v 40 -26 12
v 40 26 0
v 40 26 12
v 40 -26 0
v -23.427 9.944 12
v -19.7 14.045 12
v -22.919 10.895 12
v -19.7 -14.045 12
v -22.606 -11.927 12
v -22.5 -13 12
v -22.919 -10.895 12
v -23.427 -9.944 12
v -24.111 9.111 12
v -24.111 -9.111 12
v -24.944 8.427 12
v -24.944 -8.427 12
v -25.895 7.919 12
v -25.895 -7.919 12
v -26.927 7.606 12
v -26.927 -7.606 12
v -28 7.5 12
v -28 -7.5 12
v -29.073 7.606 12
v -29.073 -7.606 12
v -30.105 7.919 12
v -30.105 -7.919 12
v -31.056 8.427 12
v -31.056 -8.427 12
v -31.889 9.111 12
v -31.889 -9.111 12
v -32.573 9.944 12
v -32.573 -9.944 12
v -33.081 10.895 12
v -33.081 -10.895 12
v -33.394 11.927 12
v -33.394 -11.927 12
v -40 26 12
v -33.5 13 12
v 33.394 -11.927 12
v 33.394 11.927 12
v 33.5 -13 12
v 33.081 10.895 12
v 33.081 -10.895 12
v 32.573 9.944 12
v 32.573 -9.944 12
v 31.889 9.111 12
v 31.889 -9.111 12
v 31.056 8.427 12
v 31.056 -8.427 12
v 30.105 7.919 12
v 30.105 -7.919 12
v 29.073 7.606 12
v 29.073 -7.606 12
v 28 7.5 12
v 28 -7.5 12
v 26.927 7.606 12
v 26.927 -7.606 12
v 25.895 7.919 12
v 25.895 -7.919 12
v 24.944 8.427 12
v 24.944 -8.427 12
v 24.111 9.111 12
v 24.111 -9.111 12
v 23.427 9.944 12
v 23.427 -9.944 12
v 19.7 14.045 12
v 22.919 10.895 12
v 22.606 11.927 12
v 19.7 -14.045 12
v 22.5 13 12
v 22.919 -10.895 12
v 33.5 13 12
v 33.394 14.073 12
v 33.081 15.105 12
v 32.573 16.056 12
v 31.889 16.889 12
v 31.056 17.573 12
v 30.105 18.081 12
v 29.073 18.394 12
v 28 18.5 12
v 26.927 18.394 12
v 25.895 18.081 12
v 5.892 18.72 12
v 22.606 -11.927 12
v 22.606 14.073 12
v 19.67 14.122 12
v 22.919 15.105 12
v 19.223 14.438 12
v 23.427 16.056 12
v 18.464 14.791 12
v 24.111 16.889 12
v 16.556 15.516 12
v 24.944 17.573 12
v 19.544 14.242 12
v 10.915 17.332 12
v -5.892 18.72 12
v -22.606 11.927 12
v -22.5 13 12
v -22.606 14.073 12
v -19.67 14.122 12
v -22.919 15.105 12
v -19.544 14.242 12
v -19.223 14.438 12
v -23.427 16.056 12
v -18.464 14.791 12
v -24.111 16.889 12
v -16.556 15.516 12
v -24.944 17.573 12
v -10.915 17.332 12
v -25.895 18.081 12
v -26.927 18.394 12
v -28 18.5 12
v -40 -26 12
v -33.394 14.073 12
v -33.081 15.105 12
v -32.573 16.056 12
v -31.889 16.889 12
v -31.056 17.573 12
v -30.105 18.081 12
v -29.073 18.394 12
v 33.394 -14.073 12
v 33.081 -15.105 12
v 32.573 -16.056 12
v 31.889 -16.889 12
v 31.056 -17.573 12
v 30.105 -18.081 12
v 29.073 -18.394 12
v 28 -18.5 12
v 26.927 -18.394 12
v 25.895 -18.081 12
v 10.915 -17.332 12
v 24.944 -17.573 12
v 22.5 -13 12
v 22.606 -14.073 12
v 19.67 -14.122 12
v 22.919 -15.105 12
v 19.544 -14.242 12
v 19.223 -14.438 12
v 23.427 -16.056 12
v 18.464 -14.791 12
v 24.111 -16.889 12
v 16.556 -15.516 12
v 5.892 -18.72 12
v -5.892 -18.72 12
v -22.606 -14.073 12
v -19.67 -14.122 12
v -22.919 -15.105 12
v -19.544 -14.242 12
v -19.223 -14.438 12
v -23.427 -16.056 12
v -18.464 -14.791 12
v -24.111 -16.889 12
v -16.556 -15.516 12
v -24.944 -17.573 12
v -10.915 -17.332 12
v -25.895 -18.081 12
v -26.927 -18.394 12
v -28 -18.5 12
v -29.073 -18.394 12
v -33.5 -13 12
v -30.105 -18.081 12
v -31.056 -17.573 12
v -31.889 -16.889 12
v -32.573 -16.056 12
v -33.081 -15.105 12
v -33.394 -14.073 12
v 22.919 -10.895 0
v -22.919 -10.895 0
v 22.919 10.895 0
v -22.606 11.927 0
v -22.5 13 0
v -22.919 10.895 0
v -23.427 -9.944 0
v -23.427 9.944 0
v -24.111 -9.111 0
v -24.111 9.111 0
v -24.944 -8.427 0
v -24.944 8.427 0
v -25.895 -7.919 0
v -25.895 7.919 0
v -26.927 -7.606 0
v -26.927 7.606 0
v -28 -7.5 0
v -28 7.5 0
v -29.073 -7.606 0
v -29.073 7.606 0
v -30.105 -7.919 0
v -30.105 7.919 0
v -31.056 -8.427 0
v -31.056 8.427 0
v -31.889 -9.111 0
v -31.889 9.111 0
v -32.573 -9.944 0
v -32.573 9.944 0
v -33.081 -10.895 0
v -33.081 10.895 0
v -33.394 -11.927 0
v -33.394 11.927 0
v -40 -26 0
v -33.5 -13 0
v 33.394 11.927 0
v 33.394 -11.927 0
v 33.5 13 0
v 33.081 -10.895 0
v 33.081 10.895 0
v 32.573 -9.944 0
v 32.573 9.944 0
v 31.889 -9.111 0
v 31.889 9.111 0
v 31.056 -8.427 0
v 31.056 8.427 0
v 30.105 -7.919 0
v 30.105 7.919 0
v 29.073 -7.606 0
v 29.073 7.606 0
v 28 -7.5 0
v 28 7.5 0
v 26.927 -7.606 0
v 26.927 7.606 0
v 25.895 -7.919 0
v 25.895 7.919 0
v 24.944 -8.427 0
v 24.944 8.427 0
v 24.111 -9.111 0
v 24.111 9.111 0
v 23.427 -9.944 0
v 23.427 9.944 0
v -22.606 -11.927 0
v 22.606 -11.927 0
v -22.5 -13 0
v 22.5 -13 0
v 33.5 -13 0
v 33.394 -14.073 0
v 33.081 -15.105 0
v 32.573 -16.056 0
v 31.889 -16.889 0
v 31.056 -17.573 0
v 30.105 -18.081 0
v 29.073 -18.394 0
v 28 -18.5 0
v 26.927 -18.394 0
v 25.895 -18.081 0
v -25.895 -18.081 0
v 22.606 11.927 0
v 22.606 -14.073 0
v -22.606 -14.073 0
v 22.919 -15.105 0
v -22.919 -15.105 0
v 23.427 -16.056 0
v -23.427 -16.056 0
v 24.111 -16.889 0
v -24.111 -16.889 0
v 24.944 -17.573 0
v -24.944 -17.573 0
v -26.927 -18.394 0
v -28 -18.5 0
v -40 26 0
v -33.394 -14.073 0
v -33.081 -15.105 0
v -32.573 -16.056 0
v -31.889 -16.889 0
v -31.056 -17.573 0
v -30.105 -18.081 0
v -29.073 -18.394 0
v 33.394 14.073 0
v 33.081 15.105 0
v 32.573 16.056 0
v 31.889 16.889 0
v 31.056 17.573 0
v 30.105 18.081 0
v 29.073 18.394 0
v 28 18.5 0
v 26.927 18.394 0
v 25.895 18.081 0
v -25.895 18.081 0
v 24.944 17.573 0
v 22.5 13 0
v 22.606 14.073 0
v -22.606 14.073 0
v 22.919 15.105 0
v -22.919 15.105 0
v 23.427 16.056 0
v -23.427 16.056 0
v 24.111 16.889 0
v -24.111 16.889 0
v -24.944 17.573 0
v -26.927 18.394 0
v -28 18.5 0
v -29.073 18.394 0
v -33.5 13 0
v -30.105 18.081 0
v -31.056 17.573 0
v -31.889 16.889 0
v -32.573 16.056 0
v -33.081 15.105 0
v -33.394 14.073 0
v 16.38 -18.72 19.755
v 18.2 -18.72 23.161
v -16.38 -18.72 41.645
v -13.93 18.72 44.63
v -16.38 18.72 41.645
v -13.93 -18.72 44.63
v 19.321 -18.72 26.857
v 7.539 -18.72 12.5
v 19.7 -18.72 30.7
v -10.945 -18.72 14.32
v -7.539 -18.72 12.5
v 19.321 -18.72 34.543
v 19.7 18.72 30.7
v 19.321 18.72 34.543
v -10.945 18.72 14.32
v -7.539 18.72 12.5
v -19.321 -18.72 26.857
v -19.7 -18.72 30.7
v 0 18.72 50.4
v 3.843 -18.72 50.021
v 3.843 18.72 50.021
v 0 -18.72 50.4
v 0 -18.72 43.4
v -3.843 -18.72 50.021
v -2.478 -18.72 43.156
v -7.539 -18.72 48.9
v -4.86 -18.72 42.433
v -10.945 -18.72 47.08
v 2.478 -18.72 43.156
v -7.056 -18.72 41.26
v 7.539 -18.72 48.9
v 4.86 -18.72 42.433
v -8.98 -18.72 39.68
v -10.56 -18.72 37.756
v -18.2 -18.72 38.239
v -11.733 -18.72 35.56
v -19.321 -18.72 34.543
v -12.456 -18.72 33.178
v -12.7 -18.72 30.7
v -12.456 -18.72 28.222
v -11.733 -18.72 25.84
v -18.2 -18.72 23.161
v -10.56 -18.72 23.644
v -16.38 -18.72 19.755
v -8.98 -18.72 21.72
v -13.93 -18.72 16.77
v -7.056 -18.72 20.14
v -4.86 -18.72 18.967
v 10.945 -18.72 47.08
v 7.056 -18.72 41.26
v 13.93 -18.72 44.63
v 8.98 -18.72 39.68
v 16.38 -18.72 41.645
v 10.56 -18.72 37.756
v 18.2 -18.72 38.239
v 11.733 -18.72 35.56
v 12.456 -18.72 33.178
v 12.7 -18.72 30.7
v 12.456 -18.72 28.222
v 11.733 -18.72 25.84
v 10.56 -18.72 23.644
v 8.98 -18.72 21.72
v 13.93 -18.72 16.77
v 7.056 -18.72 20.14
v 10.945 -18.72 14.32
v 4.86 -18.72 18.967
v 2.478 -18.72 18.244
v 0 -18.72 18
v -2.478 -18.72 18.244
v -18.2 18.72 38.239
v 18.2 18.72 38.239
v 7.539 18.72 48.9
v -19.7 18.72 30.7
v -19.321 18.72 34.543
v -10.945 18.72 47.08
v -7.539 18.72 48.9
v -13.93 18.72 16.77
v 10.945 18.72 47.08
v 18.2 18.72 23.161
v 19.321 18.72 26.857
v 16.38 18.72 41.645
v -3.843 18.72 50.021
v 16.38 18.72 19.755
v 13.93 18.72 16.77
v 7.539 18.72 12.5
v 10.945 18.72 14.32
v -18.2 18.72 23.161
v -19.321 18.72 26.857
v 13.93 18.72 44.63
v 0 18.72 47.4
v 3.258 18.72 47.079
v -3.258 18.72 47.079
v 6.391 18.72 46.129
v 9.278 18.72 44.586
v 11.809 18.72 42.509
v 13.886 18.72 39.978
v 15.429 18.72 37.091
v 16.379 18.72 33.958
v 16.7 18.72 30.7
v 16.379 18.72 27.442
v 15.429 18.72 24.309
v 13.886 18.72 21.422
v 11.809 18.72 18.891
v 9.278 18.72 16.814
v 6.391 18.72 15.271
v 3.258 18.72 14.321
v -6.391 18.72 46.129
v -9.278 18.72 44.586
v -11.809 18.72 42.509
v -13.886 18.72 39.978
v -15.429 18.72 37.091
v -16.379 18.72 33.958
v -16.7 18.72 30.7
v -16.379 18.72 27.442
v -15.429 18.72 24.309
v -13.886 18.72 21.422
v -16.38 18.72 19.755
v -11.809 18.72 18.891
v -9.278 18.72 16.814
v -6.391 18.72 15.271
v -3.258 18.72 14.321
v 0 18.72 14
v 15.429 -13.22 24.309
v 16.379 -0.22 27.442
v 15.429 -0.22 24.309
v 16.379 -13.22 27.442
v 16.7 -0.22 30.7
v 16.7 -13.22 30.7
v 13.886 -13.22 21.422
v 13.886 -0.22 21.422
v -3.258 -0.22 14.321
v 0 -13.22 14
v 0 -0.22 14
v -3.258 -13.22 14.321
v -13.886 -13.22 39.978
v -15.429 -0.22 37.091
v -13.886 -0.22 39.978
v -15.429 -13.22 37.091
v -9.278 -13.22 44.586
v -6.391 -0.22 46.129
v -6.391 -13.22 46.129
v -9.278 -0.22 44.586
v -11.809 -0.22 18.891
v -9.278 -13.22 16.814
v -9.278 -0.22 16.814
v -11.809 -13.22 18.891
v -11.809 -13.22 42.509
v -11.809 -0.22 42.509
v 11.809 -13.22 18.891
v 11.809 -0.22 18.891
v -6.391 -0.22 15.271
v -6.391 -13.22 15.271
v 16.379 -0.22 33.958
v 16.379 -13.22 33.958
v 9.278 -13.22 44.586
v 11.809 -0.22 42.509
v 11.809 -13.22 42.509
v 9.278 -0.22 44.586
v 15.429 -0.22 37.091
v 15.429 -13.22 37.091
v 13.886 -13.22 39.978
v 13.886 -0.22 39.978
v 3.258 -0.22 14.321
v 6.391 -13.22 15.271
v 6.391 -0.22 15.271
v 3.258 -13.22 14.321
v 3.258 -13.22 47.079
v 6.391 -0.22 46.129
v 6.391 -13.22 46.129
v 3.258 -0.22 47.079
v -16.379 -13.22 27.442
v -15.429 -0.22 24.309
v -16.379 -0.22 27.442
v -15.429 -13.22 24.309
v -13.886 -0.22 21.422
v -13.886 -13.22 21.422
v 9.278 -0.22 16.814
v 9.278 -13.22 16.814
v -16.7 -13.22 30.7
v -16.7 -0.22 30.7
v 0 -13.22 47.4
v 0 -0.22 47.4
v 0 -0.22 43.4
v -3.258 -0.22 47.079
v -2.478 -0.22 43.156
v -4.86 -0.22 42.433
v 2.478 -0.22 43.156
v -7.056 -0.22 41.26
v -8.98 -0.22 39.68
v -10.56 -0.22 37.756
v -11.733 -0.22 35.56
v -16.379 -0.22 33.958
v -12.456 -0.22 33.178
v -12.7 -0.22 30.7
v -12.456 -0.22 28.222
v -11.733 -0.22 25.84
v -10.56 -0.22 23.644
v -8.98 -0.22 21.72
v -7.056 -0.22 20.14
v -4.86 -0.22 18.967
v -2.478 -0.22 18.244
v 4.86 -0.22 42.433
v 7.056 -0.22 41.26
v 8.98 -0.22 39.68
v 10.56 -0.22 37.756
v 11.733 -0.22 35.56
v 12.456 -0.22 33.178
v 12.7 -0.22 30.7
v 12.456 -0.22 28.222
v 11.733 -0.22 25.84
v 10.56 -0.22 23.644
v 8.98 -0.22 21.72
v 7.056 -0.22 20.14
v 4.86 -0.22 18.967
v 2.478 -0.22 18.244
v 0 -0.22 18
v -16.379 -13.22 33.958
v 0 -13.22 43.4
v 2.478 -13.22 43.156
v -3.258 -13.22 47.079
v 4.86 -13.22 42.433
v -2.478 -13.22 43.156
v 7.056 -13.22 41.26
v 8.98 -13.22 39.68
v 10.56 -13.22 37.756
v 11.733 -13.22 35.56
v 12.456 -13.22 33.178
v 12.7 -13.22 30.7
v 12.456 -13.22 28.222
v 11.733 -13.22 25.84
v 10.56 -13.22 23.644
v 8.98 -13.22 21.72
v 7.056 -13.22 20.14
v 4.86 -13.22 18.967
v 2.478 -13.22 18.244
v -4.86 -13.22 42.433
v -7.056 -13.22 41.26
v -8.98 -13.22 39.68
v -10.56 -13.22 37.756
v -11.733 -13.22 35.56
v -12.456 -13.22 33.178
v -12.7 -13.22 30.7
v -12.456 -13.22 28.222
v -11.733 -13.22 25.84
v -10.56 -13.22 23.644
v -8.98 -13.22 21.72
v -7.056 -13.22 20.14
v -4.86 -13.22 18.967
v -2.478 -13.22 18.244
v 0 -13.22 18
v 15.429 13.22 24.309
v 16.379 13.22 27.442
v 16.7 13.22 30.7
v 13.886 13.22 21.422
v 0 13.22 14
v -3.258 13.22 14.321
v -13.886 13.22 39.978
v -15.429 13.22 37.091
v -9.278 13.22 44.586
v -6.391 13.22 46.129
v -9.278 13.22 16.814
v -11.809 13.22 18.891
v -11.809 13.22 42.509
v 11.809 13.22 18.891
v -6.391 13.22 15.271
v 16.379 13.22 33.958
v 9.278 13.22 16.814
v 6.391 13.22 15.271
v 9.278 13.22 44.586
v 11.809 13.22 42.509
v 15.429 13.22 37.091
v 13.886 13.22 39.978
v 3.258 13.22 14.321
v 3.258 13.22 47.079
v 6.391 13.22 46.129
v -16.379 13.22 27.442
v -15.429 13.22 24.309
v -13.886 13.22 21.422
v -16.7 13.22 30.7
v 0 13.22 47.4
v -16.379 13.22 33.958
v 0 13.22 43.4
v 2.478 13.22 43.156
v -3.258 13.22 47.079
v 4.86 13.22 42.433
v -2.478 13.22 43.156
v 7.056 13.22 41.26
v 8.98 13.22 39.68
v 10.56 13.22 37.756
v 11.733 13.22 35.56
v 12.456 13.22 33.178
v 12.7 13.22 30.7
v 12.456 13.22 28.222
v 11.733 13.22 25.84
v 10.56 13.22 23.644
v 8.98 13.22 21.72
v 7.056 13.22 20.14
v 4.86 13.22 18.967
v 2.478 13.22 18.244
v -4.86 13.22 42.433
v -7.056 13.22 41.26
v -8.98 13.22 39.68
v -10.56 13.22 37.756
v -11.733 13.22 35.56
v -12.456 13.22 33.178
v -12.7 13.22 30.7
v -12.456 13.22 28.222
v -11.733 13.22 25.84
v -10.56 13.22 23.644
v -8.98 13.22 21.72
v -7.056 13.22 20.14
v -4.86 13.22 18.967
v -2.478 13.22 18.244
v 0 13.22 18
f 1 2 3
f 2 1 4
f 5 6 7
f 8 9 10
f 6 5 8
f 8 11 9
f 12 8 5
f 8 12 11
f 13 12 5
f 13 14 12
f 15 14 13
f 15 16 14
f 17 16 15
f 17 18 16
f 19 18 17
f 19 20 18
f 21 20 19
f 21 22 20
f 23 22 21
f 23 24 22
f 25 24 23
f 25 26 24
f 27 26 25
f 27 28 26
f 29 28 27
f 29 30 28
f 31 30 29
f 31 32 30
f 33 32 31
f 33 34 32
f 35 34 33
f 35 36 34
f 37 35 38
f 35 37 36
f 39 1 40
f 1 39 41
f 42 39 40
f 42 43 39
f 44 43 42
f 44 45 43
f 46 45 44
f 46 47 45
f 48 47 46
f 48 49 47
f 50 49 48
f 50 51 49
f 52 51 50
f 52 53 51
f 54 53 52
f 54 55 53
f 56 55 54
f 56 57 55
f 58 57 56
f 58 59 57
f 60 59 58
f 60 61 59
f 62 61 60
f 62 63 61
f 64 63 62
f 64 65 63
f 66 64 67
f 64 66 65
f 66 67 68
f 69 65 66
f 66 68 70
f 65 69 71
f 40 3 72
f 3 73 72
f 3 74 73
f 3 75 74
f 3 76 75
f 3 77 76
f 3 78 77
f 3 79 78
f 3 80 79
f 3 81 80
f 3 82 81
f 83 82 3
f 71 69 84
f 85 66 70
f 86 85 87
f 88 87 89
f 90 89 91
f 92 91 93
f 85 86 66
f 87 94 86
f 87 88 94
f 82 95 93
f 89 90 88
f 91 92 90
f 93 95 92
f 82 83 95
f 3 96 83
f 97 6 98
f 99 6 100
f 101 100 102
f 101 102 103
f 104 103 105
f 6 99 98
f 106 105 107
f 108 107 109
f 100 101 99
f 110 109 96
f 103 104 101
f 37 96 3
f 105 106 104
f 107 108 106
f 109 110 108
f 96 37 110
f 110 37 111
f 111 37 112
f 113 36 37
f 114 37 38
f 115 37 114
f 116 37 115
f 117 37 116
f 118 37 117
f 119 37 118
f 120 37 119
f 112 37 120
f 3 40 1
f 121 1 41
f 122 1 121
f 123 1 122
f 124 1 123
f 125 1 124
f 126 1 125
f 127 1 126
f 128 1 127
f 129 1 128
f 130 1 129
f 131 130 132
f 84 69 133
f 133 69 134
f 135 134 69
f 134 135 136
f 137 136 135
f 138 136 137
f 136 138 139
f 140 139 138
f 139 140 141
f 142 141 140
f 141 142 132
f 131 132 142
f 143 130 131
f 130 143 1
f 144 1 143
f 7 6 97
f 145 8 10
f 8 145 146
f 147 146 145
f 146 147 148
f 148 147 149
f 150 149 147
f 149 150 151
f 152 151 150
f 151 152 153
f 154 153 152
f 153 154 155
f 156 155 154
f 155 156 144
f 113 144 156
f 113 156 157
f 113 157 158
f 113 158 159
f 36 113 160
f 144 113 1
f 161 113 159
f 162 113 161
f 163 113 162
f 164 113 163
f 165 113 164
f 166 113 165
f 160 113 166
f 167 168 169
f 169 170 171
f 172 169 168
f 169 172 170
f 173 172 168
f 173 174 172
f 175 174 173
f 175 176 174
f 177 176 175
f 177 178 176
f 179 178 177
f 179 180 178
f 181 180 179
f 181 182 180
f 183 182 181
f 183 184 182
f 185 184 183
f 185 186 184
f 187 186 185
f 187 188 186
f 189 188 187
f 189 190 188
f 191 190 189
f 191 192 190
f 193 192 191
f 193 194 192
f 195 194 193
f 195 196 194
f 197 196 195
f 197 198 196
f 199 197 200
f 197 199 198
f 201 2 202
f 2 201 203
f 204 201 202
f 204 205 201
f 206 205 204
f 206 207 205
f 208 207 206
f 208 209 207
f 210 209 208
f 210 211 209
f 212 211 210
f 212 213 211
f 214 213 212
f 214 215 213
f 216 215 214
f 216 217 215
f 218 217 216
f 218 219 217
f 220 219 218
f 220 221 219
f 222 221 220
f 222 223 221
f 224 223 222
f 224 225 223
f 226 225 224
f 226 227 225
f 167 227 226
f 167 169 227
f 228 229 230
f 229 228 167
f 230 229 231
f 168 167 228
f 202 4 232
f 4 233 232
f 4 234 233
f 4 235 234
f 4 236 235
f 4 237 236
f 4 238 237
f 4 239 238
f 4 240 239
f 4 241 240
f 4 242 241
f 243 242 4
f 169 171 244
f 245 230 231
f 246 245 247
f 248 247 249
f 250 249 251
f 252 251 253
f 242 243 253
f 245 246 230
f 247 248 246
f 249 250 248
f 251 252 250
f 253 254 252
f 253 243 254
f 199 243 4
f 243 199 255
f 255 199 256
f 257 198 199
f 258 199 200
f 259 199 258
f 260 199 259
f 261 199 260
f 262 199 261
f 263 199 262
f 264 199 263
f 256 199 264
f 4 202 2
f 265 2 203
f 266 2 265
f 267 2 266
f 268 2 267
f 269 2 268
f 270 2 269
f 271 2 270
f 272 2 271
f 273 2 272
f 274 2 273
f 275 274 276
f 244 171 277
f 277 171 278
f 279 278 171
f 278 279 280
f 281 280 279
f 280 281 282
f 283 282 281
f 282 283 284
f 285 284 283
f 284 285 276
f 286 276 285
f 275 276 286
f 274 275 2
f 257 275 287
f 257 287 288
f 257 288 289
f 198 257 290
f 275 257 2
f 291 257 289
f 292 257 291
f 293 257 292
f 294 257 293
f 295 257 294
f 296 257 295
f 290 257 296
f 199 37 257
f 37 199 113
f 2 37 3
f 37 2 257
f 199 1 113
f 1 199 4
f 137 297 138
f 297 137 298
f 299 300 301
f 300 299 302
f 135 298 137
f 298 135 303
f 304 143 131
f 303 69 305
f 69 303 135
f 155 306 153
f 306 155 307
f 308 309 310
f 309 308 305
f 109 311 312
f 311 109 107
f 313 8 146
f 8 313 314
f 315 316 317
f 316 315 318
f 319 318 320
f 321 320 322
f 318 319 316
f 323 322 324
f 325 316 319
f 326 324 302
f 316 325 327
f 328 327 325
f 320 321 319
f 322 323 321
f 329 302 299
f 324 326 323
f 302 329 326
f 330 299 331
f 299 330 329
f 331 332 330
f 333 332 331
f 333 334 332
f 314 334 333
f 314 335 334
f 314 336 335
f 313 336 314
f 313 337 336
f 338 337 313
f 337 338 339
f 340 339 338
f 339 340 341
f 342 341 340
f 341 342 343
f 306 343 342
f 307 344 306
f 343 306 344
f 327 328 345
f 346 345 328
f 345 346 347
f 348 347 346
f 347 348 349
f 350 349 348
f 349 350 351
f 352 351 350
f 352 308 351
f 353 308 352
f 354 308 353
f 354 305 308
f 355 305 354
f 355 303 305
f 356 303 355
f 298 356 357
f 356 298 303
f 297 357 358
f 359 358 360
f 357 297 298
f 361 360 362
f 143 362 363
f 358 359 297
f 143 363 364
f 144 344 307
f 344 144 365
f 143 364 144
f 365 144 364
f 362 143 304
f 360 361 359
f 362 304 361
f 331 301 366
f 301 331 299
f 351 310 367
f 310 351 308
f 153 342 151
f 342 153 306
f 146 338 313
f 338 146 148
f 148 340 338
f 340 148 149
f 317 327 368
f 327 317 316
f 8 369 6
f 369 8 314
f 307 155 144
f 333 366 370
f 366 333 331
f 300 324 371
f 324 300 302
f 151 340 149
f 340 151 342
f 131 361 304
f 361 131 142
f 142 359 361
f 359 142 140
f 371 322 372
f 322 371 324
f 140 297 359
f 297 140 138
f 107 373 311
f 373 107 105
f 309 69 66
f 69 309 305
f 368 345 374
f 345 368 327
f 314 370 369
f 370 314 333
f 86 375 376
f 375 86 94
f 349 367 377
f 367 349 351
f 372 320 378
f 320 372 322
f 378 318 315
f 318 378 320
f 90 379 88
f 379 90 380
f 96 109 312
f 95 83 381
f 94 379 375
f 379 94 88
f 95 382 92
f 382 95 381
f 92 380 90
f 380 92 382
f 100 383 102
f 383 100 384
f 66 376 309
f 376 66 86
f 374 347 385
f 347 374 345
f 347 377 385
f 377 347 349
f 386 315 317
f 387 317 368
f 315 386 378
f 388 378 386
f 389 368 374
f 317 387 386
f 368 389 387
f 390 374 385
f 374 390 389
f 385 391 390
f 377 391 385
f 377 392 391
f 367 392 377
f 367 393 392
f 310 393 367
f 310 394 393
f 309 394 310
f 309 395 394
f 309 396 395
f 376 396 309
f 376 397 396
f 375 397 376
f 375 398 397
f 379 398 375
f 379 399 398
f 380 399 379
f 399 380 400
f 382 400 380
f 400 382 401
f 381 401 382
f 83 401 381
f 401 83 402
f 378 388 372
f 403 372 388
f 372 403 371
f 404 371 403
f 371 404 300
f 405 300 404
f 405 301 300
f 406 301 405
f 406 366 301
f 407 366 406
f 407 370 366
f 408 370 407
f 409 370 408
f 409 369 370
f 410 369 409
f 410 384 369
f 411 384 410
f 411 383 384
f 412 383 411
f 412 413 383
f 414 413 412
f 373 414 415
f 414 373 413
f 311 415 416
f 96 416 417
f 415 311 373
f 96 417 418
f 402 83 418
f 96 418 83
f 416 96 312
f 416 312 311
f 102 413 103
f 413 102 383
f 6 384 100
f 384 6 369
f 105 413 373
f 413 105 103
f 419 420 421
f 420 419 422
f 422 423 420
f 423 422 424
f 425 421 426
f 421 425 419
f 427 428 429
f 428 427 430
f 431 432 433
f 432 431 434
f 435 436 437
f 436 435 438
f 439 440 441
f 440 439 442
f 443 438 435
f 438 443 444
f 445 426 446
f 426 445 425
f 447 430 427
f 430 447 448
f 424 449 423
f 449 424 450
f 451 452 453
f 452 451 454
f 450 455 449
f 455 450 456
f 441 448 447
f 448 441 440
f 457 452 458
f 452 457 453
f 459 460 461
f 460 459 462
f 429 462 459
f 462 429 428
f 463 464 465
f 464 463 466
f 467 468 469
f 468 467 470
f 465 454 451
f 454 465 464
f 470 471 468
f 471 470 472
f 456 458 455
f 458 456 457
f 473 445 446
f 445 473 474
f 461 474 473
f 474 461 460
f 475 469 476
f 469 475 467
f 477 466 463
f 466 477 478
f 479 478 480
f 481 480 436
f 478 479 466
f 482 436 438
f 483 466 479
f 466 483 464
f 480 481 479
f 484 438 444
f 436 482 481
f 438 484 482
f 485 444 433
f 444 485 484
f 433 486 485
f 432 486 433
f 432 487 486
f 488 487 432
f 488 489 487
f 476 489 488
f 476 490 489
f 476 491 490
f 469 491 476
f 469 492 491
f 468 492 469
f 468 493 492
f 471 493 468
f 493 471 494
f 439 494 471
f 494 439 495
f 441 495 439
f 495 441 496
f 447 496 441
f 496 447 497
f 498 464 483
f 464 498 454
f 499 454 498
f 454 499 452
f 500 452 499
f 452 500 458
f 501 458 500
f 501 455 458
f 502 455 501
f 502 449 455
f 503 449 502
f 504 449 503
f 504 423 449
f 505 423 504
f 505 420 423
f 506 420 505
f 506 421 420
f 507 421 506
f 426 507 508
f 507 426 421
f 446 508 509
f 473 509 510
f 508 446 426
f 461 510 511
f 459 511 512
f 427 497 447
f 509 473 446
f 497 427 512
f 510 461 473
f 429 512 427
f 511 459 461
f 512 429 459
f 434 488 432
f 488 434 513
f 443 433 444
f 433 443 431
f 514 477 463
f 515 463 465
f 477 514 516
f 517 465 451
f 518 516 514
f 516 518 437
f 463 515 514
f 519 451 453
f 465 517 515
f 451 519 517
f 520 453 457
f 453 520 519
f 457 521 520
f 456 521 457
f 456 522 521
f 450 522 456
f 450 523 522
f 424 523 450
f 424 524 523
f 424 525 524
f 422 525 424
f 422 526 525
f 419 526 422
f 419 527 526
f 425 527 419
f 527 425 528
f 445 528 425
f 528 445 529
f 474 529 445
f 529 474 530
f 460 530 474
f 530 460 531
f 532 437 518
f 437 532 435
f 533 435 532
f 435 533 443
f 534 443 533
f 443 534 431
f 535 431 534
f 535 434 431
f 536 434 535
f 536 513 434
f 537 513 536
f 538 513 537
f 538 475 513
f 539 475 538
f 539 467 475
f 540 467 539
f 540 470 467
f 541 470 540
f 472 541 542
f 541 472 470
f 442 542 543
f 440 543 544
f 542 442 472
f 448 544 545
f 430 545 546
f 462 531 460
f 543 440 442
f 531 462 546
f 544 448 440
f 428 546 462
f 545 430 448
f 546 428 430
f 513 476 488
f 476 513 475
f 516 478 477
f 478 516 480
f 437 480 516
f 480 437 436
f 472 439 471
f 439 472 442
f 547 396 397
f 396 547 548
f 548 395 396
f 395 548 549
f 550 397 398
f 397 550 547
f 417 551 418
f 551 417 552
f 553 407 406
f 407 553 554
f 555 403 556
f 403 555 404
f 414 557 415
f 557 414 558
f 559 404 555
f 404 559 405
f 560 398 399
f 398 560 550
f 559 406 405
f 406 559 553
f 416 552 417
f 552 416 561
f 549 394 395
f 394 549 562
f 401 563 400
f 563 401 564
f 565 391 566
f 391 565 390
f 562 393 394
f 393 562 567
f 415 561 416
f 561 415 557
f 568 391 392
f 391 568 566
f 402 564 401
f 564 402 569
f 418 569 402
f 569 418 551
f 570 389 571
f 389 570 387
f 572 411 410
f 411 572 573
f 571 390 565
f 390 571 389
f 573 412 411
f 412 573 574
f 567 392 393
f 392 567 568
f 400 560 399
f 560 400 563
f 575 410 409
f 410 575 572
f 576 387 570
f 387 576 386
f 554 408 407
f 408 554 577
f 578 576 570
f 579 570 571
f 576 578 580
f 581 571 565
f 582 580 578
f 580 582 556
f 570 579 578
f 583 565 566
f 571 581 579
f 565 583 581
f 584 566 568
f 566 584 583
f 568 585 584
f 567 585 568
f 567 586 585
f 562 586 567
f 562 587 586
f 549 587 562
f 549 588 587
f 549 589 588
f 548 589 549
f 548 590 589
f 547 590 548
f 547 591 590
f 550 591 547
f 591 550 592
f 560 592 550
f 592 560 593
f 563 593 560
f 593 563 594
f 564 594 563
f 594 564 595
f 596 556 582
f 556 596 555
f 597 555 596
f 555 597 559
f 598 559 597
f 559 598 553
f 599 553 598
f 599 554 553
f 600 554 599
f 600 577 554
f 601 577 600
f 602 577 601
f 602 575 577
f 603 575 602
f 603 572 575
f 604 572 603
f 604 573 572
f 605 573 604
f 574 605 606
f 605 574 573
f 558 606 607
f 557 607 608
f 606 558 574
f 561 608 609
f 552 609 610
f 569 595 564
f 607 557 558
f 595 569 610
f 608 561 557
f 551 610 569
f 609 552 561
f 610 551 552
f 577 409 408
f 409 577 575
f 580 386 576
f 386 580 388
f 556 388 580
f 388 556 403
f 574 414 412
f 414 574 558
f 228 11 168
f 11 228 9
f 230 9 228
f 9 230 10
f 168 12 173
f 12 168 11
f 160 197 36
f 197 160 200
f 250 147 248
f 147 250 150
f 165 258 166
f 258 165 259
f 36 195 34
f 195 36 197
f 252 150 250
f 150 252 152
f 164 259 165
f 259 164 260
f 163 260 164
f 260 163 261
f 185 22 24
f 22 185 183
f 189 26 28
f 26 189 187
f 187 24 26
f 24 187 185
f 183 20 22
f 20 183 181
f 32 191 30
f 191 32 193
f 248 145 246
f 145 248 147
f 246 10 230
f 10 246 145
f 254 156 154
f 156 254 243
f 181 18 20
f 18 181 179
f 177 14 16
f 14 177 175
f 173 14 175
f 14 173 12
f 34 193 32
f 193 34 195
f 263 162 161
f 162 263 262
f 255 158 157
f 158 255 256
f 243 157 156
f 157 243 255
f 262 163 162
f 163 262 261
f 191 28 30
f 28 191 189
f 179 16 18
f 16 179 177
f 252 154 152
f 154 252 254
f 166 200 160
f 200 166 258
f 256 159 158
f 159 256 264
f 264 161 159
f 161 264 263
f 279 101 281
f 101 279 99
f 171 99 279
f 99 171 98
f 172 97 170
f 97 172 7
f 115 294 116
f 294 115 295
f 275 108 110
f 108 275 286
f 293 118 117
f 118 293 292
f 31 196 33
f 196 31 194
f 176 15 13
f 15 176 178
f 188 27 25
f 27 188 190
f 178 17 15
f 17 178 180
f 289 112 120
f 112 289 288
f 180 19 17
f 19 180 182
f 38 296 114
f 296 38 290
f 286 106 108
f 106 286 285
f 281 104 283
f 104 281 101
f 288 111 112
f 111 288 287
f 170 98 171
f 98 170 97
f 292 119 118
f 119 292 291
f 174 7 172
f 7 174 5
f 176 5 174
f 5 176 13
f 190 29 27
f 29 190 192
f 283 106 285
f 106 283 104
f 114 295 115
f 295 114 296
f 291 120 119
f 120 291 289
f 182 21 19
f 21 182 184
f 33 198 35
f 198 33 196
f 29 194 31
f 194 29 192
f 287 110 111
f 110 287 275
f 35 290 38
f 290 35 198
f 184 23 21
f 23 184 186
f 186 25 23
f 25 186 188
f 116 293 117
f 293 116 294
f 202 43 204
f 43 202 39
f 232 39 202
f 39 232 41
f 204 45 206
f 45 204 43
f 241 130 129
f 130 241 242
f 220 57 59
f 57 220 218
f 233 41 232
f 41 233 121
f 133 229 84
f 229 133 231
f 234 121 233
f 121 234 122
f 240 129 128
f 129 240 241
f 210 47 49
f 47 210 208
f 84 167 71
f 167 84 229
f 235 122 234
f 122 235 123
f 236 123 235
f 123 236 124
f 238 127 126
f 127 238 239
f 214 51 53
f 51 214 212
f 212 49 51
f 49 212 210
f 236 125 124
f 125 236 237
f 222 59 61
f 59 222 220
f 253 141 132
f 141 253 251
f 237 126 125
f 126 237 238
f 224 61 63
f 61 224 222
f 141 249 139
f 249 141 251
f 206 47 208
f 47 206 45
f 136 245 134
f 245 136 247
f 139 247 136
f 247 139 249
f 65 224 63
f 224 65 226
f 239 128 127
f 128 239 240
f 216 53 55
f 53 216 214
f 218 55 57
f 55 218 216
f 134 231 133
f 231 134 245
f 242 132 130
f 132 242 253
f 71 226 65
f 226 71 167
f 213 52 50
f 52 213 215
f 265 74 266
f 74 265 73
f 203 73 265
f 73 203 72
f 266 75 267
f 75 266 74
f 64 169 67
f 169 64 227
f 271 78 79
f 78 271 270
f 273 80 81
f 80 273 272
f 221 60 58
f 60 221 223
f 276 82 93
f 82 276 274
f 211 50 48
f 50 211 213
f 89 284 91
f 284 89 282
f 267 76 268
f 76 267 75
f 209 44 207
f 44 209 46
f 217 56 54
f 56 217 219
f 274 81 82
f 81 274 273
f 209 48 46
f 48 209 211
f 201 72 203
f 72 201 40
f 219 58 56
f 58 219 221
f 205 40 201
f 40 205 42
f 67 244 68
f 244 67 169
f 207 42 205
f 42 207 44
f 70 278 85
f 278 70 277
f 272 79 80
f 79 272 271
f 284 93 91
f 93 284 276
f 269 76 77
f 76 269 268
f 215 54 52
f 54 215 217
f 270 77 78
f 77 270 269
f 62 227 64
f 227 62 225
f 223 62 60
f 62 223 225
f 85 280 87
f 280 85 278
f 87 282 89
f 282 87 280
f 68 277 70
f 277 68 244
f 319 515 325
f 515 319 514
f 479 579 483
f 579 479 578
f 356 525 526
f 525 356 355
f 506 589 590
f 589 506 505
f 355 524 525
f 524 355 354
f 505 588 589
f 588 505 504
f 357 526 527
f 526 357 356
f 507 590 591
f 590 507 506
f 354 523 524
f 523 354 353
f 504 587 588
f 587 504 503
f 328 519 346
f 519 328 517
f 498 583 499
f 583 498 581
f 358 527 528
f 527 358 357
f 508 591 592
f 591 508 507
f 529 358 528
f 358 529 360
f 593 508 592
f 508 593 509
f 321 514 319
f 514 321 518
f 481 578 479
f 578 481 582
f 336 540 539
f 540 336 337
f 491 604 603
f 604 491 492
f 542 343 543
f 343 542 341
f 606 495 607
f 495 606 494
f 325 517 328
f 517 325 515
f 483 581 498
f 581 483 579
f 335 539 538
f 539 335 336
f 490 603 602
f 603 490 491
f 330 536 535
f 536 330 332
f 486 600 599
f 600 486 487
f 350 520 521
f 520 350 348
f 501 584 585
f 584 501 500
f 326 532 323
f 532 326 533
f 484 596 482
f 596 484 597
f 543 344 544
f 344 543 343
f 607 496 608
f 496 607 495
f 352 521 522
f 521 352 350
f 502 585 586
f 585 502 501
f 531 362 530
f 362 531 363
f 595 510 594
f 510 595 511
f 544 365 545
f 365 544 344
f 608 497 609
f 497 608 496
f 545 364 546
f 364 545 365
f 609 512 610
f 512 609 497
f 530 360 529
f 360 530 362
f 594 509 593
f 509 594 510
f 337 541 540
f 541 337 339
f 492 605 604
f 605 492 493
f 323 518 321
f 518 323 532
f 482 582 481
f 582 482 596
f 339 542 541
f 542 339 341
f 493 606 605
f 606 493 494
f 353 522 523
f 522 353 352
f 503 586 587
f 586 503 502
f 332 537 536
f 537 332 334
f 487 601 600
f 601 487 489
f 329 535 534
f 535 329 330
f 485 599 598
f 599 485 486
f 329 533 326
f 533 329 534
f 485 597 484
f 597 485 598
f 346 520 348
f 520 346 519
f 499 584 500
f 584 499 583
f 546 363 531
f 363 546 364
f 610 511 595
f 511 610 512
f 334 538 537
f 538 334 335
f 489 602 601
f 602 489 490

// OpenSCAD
$fn = 32;

// ----------------------------------------------------------------------
// Bearing block: 80 x 52 mm base, 25.4 mm bore at 30.7 mm
// ----------------------------------------------------------------------

// --- parameters (mm) ---
base_w = 80;              // base width
base_d = 52;              // base depth
base_t = 12;              // base thickness
bore_d = 25.4;            // shaft / bearing bore
house_r = 19.7;           // housing outer radius
house_len = 37.44;        // housing length along the shaft
foot_w = 39.4;            // foot width under the housing
foot_len = 27.44;         // foot length along the shaft
axis_z = 30.7;            // bore axis height above the base
holes_d = 11;             // mounting holes
hole_x = 28;              // mounting hole spacing
seat_d = 8;               // bearing seat depth
seat_wall = 4;            // seat wall thickness

difference() {
  union() {
    /* base plate with its underside on z = 0 */
    translate([0, 0, base_t / 2]) cube([base_w, base_d, base_t], center = true);
    /* hull foot: a straight web blending into the round housing */
    hull() {
      translate([0, 0, base_t - 0.5]) cube([foot_w, foot_len, 1.6], center = true);
      translate([0, 0, axis_z]) rotate([-90, 0, 0]) cylinder(h = house_len, d = 2 * house_r, center = true);
    }
  }
  /* bore through the housing, 2.5 mm clear on both sides */
  translate([0, 0, axis_z]) rotate([-90, 0, 0]) cylinder(h = house_len + 5, d = bore_d, center = true);
  /* bearing seats, recessed into both ends of the housing */
  for (sy = [-1, 1]) {
    translate([0, sy * (house_len / 2 - seat_d + 2.5), axis_z]) rotate([-90, 0, 0]) cylinder(h = seat_d + 5, d = bore_d + 2 * seat_wall);
  }
  /* mounting holes through the base plate */
  for (hx = [-28, 28]) {
    for (hy = [-13, 13]) {
      translate([hx, hy, -2.5]) cylinder(h = base_t + 5, d = holes_d);
    }
  }
}
